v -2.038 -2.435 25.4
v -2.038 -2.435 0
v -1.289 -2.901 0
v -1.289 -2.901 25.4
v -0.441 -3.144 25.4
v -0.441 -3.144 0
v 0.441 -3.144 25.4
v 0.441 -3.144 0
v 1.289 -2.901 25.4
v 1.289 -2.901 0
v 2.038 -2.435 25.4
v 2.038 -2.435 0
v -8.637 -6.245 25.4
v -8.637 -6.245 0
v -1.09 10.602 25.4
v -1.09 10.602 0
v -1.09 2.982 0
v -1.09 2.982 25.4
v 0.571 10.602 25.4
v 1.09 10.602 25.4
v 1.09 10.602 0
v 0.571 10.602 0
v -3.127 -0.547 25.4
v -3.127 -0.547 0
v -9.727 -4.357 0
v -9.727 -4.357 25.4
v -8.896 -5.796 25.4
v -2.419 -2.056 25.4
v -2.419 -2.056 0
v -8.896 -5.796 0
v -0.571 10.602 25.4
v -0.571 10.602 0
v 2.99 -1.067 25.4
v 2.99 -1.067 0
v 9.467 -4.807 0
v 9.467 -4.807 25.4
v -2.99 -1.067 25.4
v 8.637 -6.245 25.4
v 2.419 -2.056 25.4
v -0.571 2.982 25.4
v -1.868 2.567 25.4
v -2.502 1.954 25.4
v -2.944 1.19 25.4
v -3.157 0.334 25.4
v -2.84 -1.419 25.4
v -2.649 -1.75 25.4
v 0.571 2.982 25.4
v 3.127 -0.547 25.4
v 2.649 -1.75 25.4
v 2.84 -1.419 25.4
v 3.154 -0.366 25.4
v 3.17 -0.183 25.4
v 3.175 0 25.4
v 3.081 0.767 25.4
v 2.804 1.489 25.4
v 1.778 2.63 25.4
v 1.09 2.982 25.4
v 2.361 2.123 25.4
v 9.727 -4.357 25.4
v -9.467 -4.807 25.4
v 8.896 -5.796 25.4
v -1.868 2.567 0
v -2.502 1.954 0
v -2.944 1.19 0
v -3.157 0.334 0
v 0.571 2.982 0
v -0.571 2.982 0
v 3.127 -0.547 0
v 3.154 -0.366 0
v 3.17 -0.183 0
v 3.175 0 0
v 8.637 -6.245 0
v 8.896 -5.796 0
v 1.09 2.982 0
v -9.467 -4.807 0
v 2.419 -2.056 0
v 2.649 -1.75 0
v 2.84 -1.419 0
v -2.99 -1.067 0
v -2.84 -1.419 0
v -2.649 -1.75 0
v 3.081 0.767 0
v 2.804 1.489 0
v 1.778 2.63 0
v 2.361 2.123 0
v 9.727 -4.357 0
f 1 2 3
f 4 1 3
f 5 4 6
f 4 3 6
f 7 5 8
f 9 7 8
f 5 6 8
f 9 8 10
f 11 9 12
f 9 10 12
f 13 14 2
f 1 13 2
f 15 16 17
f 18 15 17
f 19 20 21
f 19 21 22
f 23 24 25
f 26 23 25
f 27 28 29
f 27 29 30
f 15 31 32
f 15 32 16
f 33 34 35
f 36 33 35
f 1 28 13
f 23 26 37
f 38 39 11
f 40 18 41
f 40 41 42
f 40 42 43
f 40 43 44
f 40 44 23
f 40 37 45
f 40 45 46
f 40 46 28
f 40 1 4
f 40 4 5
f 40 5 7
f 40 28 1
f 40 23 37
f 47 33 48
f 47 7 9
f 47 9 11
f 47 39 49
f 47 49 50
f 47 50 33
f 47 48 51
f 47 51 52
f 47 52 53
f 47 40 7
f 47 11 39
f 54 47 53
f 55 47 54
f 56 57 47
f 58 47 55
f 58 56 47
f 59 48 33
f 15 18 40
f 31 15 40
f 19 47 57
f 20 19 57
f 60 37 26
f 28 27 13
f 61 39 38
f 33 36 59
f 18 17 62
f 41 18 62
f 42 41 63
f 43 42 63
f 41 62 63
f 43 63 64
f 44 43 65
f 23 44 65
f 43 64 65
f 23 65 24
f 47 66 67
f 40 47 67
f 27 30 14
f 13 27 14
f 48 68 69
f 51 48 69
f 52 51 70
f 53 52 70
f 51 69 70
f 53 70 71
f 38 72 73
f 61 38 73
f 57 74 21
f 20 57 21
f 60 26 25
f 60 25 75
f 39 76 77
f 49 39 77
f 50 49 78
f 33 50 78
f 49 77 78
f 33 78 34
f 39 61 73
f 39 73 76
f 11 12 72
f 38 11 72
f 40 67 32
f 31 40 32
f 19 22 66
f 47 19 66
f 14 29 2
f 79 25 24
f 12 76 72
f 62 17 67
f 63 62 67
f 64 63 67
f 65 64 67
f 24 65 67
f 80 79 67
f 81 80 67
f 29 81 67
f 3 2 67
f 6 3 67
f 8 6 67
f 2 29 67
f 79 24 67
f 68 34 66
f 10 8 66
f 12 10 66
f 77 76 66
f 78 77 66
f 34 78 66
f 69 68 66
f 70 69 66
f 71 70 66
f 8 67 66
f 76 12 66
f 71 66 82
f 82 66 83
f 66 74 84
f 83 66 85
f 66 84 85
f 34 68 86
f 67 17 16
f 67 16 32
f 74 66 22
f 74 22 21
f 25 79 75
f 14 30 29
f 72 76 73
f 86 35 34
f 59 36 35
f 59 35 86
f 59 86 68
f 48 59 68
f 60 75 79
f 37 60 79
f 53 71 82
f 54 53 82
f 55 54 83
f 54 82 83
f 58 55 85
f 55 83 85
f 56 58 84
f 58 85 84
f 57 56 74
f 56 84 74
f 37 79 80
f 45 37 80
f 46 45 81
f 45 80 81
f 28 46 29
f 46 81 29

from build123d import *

# Parameters (mm, degrees)
F1_DEPTH = 25.4


with BuildPart() as f1:
    # F0 (on Top) → F1 (new body)
    with BuildSketch(Plane.XY):
        with BuildLine():
            ThreePointArc((0.5710253026, 3.1232283144), (0.8333744276, 3.0636762335), (1.0897403684, 2.9821285904))
            Line((1.0897403684, 2.9821285904), (1.0897403684, 10.6021285904))
            Line((1.0897403684, 10.6021285904), (0.5710253026, 10.6021285904))
            Line((0.5710253026, 10.6021285904), (0.5710253026, 3.1232283144))
        make_face()
        with BuildLine():
            ThreePointArc((-1.0897403684, 2.9821285904), (-0.8333744276, 3.0636762335), (-0.5710253026, 3.1232283144))
            Line((-0.5710253026, 3.1232283144), (-0.5710253026, 10.6021285904))
            Line((-0.5710253026, 10.6021285904), (-1.0897403684, 10.6021285904))
            Line((-1.0897403684, 10.6021285904), (-1.0897403684, 2.9821285904))
        make_face()
        with BuildLine():
            ThreePointArc((-2.9903077134, -1.0670917389), (-3.0699086609, -0.8101146916), (-3.1274693008, -0.5473214526))
            Line((-3.1274693008, -0.5473214526), (-9.7265828776, -4.3573214526))
            Line((-9.7265828776, -4.3573214526), (-9.4672253448, -4.8065418769))
            Line((-9.4672253448, -4.8065418769), (-2.9903077134, -1.0670917389))
        make_face()
        with BuildLine():
            Line((-8.6368425092, -6.2448071378), (-2.0377289324, -2.4348071378))
            ThreePointArc((-2.0377289324, -2.4348071378), (-2.2365342333, -2.2535615419), (-2.4192824108, -2.0561365755))
            Line((-2.4192824108, -2.0561365755), (-8.8962000421, -5.7955867135))
            Line((-8.8962000421, -5.7955867135), (-8.6368425092, -6.2448071378))
        make_face()
        with BuildLine():
            Line((8.8962000421, -5.7955867135), (2.4192824108, -2.0561365755))
            ThreePointArc((2.4192824108, -2.0561365755), (2.2365342333, -2.2535615419), (2.0377289324, -2.4348071378))
            Line((2.0377289324, -2.4348071378), (8.6368425092, -6.2448071378))
            Line((8.6368425092, -6.2448071378), (8.8962000421, -5.7955867135))
        make_face()
        with BuildLine():
            Line((9.7265828776, -4.3573214526), (3.1274693008, -0.5473214526))
            ThreePointArc((3.1274693008, -0.5473214526), (3.0699086609, -0.8101146916), (2.9903077134, -1.0670917389))
            Line((2.9903077134, -1.0670917389), (9.4672253448, -4.8065418769))
            Line((9.4672253448, -4.8065418769), (9.7265828776, -4.3573214526))
        make_face()
        with BuildLine():
            Line((0.5710253026, 2.9821285904), (1.0897403684, 2.9821285904))
            ThreePointArc((1.0897403684, 2.9821285904), (0.8333744276, 3.0636762335), (0.5710253026, 3.1232283144))
            Line((0.5710253026, 3.1232283144), (0.5710253026, 2.9821285904))
        make_face()
        with BuildLine():
            Line((-0.5710253026, 2.9821285904), (-0.5710253026, 3.1232283144))
            ThreePointArc((-0.5710253026, 3.1232283144), (-0.8333744276, 3.0636762335), (-1.0897403684, 2.9821285904))
            Line((-1.0897403684, 2.9821285904), (-0.5710253026, 2.9821285904))
        make_face()
        with BuildLine():
            ThreePointArc((3.1274693008, -0.5473214526), (3.1630950057, -0.2746907078), (3.175, 0))
            ThreePointArc((3.175, 0), (2.6019752756, 1.819436634), (1.0897403684, 2.9821285904))
            Line((1.0897403684, 2.9821285904), (0.5710253026, 2.9821285904))
            Line((0.5710253026, 2.9821285904), (-0.5710253026, 2.9821285904))
            Line((-0.5710253026, 2.9821285904), (-1.0897403684, 2.9821285904))
            ThreePointArc((-1.0897403684, 2.9821285904), (-2.749630657, 1.5875), (-3.1274693008, -0.5473214526))
            ThreePointArc((-3.1274693008, -0.5473214526), (-3.0699086609, -0.8101146916), (-2.9903077134, -1.0670917389))
            ThreePointArc((-2.9903077134, -1.0670917389), (-2.749630657, -1.5875), (-2.4192824108, -2.0561365755))
            ThreePointArc((-2.4192824108, -2.0561365755), (-2.2365342333, -2.2535615419), (-2.0377289324, -2.4348071378))
            ThreePointArc((-2.0377289324, -2.4348071378), (0, -3.175), (2.0377289324, -2.4348071378))
            ThreePointArc((2.0377289324, -2.4348071378), (2.2365342333, -2.2535615419), (2.4192824108, -2.0561365755))
            ThreePointArc((2.4192824108, -2.0561365755), (2.749630657, -1.5875), (2.9903077134, -1.0670917389))
            ThreePointArc((2.9903077134, -1.0670917389), (3.0699086609, -0.8101146916), (3.1274693008, -0.5473214526))
        make_face()
    extrude(amount=F1_DEPTH)


solid = f1.part
